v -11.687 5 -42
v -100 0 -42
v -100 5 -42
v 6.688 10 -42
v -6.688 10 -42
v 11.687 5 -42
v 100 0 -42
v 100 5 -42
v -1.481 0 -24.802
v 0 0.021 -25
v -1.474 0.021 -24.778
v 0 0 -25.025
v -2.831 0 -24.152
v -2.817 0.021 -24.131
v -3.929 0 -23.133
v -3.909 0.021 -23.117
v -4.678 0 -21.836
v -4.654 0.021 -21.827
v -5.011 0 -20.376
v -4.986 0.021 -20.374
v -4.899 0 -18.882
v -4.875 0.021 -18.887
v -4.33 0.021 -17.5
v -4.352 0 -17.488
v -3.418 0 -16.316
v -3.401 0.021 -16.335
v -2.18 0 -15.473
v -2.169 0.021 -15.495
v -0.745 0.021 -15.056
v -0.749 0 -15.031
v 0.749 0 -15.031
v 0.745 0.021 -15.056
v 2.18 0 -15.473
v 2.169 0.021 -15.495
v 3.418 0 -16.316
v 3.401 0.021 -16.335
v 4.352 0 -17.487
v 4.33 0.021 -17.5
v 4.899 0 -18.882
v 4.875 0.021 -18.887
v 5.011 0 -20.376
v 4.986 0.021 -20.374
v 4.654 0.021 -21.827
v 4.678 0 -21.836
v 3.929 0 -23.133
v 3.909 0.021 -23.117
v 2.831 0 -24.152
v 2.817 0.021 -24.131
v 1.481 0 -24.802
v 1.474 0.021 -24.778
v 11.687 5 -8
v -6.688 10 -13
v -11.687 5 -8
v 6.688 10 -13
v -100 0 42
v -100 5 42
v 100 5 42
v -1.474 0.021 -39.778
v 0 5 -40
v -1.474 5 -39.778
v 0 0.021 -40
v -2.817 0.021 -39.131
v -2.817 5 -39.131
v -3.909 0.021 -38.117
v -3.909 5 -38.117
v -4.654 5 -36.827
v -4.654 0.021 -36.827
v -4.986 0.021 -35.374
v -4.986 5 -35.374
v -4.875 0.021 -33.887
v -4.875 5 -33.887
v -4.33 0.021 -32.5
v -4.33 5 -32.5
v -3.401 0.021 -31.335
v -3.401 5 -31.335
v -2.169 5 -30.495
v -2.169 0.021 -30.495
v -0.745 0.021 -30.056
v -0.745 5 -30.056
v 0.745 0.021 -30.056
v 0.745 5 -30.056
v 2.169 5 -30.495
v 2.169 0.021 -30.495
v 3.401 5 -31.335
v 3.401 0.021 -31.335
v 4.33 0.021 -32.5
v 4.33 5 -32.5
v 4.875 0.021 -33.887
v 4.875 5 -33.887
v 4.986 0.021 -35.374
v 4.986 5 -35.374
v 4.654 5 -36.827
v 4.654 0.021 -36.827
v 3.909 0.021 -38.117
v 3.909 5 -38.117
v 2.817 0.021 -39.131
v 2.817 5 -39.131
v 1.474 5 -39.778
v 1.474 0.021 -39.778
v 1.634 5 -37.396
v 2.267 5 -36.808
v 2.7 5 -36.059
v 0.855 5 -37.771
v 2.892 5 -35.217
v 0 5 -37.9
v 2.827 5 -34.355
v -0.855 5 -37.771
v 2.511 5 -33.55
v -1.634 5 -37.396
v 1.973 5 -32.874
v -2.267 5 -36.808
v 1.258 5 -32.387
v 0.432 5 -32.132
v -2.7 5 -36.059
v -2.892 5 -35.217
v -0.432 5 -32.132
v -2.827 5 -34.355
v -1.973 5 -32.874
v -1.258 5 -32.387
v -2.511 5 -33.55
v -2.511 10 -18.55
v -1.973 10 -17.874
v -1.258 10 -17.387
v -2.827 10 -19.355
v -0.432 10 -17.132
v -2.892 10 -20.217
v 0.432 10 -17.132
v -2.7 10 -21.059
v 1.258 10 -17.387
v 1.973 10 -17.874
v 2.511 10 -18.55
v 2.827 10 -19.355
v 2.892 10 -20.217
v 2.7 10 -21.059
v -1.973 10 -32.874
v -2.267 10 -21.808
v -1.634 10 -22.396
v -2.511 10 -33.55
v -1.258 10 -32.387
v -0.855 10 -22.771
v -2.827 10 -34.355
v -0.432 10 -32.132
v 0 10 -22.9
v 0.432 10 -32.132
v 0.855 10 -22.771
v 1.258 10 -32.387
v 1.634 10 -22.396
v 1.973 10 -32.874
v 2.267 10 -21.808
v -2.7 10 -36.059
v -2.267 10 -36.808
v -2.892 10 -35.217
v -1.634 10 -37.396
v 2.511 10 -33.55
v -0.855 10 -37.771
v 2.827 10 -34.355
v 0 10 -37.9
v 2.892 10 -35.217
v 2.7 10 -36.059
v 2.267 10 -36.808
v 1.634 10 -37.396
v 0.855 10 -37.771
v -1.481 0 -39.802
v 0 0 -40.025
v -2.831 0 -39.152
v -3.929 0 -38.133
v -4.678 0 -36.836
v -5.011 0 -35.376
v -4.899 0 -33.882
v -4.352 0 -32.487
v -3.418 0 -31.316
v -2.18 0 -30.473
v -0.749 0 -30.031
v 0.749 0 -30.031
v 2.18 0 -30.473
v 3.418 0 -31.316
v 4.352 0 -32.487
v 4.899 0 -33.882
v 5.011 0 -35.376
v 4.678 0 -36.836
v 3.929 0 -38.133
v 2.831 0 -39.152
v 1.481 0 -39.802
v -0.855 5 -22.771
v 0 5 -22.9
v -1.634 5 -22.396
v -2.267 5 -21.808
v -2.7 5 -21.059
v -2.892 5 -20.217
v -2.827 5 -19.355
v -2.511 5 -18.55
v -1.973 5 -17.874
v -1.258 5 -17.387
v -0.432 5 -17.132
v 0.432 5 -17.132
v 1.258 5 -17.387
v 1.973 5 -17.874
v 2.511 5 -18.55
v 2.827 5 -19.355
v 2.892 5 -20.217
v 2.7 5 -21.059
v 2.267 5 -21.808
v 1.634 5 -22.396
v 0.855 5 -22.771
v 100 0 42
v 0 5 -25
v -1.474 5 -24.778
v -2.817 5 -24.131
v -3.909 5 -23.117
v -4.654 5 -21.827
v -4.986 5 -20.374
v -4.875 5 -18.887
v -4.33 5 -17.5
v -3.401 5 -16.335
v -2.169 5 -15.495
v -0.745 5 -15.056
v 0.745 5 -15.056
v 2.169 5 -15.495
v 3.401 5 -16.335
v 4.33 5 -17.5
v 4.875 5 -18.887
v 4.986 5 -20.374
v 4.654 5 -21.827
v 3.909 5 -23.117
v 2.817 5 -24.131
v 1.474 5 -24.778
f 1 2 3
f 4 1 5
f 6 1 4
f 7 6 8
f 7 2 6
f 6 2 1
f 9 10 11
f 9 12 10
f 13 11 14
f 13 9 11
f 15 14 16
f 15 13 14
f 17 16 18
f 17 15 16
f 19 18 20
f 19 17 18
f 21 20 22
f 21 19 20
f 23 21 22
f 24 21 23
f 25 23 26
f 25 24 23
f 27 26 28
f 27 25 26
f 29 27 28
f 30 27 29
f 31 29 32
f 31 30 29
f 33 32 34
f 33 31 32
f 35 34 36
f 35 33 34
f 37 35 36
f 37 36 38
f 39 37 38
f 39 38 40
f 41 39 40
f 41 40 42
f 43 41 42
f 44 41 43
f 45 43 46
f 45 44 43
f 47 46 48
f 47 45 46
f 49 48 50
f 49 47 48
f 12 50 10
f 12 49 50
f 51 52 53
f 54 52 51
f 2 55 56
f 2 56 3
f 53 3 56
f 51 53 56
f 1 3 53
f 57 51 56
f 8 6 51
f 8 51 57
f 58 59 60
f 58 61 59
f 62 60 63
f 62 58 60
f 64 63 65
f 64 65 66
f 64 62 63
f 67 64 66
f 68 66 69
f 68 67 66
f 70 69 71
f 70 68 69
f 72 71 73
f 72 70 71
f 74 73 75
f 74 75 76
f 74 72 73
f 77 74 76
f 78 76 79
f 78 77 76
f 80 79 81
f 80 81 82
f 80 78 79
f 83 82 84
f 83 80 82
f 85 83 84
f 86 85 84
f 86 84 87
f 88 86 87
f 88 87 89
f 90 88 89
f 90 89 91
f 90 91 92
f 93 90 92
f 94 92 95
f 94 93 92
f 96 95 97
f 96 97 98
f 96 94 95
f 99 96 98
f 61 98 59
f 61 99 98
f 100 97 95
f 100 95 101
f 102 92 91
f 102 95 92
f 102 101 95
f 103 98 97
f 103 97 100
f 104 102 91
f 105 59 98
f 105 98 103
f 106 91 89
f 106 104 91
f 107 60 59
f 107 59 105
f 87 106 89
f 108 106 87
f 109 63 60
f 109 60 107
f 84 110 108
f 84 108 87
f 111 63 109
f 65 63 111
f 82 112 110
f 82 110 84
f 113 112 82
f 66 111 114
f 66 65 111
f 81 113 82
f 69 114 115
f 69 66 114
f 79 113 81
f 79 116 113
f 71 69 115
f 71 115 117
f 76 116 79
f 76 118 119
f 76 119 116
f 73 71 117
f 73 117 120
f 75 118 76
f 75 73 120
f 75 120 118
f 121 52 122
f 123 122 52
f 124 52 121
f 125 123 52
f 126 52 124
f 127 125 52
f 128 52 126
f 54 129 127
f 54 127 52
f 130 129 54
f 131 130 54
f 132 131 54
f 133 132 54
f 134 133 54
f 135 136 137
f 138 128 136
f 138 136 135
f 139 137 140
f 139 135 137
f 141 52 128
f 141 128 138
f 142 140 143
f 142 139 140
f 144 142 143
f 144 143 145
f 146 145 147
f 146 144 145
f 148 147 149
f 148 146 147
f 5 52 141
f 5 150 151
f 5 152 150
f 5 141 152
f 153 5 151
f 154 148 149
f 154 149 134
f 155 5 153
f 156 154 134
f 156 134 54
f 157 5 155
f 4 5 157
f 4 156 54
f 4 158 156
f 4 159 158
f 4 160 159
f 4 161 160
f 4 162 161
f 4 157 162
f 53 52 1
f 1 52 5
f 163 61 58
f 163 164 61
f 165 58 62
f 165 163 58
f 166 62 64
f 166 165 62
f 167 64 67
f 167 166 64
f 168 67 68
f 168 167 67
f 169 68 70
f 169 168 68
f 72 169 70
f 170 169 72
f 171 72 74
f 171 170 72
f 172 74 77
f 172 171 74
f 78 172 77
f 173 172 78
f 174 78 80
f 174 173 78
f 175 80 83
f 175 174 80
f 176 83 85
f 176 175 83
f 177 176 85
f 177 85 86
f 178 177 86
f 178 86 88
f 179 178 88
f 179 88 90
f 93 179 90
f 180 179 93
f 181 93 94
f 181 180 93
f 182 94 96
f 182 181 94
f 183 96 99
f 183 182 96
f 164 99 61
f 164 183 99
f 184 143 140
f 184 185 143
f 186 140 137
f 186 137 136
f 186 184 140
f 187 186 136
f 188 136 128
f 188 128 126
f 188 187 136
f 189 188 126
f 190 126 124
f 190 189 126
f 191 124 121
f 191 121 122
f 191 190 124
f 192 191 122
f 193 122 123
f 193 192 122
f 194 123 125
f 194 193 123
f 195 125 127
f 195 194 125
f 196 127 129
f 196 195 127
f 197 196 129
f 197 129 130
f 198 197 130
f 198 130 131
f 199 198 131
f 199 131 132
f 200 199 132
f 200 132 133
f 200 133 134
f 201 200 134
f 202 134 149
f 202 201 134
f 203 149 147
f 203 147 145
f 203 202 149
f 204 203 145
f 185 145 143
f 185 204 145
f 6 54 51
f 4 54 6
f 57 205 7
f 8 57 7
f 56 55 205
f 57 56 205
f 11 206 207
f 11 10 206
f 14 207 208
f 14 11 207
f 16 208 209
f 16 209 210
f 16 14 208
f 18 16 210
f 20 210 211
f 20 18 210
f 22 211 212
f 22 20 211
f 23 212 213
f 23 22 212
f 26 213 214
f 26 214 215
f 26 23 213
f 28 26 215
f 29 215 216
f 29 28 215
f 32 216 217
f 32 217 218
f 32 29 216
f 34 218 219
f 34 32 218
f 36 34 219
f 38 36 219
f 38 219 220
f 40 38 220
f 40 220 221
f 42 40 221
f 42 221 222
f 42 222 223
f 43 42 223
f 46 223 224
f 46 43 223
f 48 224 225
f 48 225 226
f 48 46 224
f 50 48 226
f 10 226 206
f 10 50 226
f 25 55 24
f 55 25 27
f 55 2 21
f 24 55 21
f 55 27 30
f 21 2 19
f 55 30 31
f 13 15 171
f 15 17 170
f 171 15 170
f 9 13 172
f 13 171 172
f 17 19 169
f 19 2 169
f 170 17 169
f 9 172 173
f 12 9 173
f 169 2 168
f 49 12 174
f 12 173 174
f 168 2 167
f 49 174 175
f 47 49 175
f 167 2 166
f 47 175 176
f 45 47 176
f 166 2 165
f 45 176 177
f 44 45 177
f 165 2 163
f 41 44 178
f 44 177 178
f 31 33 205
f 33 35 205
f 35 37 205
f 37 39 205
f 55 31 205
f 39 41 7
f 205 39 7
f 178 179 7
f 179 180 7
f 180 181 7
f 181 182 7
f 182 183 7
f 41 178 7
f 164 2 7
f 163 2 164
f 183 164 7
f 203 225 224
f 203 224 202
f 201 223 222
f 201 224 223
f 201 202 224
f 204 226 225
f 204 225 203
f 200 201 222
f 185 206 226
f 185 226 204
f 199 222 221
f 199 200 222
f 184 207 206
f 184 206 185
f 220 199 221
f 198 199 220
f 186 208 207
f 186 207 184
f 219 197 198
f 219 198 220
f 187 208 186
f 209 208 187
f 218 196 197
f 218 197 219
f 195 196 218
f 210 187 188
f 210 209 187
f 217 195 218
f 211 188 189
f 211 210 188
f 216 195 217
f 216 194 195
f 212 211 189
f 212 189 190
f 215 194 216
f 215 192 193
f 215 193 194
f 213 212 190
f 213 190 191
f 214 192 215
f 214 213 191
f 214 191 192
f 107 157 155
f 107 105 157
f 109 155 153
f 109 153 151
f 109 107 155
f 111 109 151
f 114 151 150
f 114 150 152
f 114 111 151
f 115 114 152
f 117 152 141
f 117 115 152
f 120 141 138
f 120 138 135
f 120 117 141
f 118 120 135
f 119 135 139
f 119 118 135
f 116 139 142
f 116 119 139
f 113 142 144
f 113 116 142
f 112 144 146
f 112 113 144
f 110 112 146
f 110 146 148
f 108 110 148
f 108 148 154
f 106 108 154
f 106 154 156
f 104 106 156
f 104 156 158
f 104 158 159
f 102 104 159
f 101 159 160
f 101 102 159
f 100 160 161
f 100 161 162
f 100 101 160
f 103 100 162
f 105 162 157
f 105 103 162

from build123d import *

# Parameters (mm, degrees)
SKETCH2_W                     = 200
SKETCH2_H                     = 84
BOSS_EXTRUDE1_DEPTH           = 5
SKETCH5_W                     = 13.375130616
SKETCH5_H                     = 29
BOSS_EXTRUDE2_DEPTH           = 5
CBORE_FOR_M5_SHCS4_AT_2_COUNT = 2
CBORE_FOR_M5_SHCS4_AT_2_PITCH = 15
CHAMFER1_SIZE                 = 5


with BuildPart() as part:
    # Sketch2 → Boss-Extrude1 (new body)
    with BuildSketch(Plane(origin=(0, 0, 0), x_dir=(1, 0, 0), z_dir=(0, 1, 0))):
        Rectangle(SKETCH2_W, SKETCH2_H)
    extrude(amount=BOSS_EXTRUDE1_DEPTH)

    # Sketch5 → Boss-Extrude2 (add)
    with BuildSketch(Plane(origin=(0, 5, 0), x_dir=(1, 0, 0), z_dir=(0, 1, 0))):
        with Locations((0, 27.5)):
            Rectangle(SKETCH5_W, SKETCH5_H)
    extrude(amount=BOSS_EXTRUDE2_DEPTH)

    # Sketch4 → CBORE for M5 SHCS4 (revolve, cut)
    with BuildSketch(Plane(origin=(0, 0, -20), x_dir=(0, 0, -1), z_dir=(1, 0, 0))):
        Polygon((0, 0), (0, 10), (2.9, 10), (2.9, 5), (5, 5), (5, 0.020977491), (5.025, 0), align=None)
    cbore_for_m5_shcs4 = revolve(axis=Axis((0, -6.35, -20), (0, 1, 0)), mode=Mode.SUBTRACT)

    # CBORE for M5 SHCS4 at 2: CBORE for M5 SHCS4 ×2
    with Locations(*[(0, 0, -i * CBORE_FOR_M5_SHCS4_AT_2_PITCH) for i in range(1, CBORE_FOR_M5_SHCS4_AT_2_COUNT)]):
        add(cbore_for_m5_shcs4, mode=Mode.SUBTRACT)

    # Chamfer1
    chamfer1_edges = [part.edges().sort_by_distance(p)[0] for p in [
        (-6.687565308, 5, -27.5),
        (0, 5, -13),
        (6.687565308, 5, -27.5),
    ]]
    chamfer(chamfer1_edges, length=CHAMFER1_SIZE - 0.0001)  # a hair under: the kernel refuses the full size


solid = part.part
